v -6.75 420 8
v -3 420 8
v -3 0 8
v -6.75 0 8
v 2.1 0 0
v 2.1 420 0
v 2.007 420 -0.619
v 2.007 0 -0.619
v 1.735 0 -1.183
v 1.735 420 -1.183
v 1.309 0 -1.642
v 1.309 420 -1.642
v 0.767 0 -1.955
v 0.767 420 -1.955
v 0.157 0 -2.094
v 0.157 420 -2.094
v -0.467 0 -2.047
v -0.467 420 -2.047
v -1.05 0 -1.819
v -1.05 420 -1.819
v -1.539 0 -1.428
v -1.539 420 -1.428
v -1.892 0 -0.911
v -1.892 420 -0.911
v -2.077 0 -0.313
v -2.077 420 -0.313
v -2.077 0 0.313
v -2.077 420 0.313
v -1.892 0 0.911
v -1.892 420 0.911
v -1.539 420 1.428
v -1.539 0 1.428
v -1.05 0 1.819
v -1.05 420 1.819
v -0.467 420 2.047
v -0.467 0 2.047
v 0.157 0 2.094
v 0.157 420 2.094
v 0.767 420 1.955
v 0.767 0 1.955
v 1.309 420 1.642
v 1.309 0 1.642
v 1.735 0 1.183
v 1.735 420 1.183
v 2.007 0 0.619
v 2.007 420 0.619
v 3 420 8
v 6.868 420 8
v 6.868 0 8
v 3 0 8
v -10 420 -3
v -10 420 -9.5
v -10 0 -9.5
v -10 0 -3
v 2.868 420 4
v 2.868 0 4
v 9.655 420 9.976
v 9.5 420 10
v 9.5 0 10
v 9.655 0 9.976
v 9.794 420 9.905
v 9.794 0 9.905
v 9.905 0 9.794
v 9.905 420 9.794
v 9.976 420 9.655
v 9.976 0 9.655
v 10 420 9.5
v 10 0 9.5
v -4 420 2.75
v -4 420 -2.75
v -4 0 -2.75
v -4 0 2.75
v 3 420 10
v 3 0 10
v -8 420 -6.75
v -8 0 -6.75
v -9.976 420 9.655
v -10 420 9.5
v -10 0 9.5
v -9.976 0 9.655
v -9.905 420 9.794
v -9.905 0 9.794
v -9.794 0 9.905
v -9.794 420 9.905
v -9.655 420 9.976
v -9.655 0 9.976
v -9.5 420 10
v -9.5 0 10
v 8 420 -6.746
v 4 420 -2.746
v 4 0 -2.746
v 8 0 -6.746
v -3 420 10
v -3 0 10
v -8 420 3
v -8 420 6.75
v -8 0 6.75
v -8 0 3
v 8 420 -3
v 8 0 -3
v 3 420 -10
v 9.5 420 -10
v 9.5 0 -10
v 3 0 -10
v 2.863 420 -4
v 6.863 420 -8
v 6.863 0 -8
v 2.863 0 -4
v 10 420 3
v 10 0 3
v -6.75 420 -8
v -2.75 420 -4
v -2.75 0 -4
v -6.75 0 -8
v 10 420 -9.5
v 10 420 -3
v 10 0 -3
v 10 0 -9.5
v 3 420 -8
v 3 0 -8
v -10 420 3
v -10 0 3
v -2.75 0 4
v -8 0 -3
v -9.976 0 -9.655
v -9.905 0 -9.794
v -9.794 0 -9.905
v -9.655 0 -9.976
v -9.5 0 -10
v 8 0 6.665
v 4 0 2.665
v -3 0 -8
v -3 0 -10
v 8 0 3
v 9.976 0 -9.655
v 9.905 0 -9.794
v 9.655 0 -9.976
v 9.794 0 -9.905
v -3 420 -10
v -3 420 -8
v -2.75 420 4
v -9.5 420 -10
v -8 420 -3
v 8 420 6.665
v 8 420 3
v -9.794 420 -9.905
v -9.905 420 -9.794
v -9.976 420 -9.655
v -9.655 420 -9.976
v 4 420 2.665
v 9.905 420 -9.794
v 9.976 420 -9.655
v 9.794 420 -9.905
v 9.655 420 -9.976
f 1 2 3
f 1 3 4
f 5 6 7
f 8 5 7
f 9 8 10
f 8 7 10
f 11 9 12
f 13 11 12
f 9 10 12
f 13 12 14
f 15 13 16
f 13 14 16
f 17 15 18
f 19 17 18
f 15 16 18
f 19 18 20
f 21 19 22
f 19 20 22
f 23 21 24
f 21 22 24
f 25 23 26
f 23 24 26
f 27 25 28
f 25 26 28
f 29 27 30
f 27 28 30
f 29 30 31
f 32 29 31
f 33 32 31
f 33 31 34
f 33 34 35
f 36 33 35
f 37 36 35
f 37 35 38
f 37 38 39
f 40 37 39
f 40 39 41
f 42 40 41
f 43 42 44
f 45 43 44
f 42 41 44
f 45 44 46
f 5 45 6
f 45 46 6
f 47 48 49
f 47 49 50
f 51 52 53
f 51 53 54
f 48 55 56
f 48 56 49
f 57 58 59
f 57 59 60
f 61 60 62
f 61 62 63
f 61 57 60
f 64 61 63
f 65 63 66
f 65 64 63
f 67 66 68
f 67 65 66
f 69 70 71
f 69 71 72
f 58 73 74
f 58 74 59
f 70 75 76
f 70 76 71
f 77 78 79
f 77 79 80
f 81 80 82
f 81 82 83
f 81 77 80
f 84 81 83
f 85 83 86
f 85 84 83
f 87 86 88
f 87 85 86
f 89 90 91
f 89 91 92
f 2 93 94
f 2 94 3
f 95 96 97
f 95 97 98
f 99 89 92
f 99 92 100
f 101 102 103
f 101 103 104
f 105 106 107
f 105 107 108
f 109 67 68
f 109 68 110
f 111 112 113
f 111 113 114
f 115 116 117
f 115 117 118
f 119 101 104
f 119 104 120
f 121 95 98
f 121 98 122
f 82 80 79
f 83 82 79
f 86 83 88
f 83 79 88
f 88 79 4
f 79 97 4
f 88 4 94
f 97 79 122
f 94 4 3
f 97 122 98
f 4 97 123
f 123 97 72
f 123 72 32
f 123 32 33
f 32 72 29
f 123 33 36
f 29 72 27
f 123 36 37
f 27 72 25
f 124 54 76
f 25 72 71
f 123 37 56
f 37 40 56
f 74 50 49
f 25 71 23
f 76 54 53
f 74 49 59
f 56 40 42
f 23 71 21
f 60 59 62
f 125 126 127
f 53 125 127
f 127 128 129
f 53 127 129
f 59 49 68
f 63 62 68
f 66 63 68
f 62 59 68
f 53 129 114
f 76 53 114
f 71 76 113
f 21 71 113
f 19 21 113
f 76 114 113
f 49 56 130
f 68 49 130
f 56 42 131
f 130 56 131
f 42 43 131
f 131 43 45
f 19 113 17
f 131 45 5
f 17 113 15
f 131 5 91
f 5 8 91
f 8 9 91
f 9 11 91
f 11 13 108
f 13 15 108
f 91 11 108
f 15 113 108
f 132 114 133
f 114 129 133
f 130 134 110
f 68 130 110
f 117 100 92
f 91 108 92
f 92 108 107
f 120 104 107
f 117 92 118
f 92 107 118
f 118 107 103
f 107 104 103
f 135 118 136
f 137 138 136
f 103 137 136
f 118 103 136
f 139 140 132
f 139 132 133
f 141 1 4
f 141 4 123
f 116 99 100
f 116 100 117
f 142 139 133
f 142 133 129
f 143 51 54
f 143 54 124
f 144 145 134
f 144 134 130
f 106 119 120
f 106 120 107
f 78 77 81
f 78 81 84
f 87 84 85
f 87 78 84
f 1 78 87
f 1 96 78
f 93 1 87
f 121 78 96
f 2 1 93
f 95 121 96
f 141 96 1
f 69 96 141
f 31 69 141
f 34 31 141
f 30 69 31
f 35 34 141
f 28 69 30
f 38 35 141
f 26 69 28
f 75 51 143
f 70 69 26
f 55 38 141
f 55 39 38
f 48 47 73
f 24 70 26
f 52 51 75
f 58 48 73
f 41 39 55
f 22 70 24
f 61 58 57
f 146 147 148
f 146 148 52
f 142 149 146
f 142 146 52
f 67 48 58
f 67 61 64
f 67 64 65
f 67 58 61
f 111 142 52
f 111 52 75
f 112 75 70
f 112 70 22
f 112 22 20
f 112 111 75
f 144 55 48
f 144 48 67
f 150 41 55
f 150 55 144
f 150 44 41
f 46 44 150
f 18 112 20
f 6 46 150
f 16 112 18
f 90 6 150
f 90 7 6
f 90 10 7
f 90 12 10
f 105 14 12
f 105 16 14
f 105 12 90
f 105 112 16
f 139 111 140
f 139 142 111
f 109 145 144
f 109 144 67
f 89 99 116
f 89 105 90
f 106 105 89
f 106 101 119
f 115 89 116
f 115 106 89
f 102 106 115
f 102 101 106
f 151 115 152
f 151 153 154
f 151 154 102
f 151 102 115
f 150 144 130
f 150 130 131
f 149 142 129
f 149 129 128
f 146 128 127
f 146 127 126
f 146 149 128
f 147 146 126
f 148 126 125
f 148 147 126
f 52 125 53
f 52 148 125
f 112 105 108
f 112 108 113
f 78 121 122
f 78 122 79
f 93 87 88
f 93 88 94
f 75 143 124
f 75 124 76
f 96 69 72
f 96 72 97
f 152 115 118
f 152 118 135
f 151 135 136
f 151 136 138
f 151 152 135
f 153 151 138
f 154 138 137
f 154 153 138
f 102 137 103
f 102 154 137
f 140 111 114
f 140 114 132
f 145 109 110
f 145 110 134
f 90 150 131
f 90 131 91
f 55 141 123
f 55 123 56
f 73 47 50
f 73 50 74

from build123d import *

# Parameters (mm, degrees)
SKETCH1_R           = 2.1
BOSS_EXTRUDE1_DEPTH = 420


with BuildPart() as part:
    # Sketch1 → Boss-Extrude1 (new body)
    with BuildSketch(Plane(origin=(0, 420, 0), x_dir=(1, 0, 0), z_dir=(0, 1, 0))):
        with BuildLine():
            Line((4, 2.746364236), (8, 6.746364236))
            Line((8, 6.746364236), (8, 3))
            Line((8, 3), (10, 3))
            Line((10, 3), (10, 9.5))
            ThreePointArc((10, 9.5), (9.853553391, 9.853553391), (9.5, 10))
            Line((9.5, 10), (3, 10))
            Line((3, 10), (3, 8))
            Line((3, 8), (6.863334179, 8))
            Line((6.863334179, 8), (2.863334179, 4))
            Line((2.863334179, 4), (-2.75, 4))
            Line((-2.75, 4), (-6.75, 8))
            Line((-6.75, 8), (-3, 8))
            Line((-3, 8), (-3, 10))
            Line((-3, 10), (-9.5, 10))
            ThreePointArc((-9.5, 10), (-9.853553391, 9.853553391), (-10, 9.5))
            Line((-10, 9.5), (-10, 3))
            Line((-10, 3), (-8, 3))
            Line((-8, 3), (-8, 6.75))
            Line((-8, 6.75), (-4, 2.75))
            Line((-4, 2.75), (-4, -2.75))
            Line((-4, -2.75), (-8, -6.75))
            Line((-8, -6.75), (-8, -3))
            Line((-8, -3), (-10, -3))
            Line((-10, -3), (-10, -9.5))
            ThreePointArc((-10, -9.5), (-9.853553391, -9.853553391), (-9.5, -10))
            Line((-9.5, -10), (-3, -10))
            Line((-3, -10), (-3, -8))
            Line((-3, -8), (-6.75, -8))
            Line((-6.75, -8), (-2.75, -4))
            Line((-2.75, -4), (2.868469119, -4))
            Line((2.868469119, -4), (6.868469119, -8))
            Line((6.868469119, -8), (3, -8))
            Line((3, -8), (3, -10))
            Line((3, -10), (9.5, -10))
            ThreePointArc((9.5, -10), (9.853553391, -9.853553391), (10, -9.5))
            Line((10, -9.5), (10, -3))
            Line((10, -3), (8, -3))
            Line((8, -3), (8, -6.665189266))
            Line((8, -6.665189266), (4, -2.665189266))
            Line((4, -2.665189266), (4, 2.746364236))
        make_face()
        Circle(SKETCH1_R, mode=Mode.SUBTRACT)
    extrude(amount=-BOSS_EXTRUDE1_DEPTH)


solid = part.part
